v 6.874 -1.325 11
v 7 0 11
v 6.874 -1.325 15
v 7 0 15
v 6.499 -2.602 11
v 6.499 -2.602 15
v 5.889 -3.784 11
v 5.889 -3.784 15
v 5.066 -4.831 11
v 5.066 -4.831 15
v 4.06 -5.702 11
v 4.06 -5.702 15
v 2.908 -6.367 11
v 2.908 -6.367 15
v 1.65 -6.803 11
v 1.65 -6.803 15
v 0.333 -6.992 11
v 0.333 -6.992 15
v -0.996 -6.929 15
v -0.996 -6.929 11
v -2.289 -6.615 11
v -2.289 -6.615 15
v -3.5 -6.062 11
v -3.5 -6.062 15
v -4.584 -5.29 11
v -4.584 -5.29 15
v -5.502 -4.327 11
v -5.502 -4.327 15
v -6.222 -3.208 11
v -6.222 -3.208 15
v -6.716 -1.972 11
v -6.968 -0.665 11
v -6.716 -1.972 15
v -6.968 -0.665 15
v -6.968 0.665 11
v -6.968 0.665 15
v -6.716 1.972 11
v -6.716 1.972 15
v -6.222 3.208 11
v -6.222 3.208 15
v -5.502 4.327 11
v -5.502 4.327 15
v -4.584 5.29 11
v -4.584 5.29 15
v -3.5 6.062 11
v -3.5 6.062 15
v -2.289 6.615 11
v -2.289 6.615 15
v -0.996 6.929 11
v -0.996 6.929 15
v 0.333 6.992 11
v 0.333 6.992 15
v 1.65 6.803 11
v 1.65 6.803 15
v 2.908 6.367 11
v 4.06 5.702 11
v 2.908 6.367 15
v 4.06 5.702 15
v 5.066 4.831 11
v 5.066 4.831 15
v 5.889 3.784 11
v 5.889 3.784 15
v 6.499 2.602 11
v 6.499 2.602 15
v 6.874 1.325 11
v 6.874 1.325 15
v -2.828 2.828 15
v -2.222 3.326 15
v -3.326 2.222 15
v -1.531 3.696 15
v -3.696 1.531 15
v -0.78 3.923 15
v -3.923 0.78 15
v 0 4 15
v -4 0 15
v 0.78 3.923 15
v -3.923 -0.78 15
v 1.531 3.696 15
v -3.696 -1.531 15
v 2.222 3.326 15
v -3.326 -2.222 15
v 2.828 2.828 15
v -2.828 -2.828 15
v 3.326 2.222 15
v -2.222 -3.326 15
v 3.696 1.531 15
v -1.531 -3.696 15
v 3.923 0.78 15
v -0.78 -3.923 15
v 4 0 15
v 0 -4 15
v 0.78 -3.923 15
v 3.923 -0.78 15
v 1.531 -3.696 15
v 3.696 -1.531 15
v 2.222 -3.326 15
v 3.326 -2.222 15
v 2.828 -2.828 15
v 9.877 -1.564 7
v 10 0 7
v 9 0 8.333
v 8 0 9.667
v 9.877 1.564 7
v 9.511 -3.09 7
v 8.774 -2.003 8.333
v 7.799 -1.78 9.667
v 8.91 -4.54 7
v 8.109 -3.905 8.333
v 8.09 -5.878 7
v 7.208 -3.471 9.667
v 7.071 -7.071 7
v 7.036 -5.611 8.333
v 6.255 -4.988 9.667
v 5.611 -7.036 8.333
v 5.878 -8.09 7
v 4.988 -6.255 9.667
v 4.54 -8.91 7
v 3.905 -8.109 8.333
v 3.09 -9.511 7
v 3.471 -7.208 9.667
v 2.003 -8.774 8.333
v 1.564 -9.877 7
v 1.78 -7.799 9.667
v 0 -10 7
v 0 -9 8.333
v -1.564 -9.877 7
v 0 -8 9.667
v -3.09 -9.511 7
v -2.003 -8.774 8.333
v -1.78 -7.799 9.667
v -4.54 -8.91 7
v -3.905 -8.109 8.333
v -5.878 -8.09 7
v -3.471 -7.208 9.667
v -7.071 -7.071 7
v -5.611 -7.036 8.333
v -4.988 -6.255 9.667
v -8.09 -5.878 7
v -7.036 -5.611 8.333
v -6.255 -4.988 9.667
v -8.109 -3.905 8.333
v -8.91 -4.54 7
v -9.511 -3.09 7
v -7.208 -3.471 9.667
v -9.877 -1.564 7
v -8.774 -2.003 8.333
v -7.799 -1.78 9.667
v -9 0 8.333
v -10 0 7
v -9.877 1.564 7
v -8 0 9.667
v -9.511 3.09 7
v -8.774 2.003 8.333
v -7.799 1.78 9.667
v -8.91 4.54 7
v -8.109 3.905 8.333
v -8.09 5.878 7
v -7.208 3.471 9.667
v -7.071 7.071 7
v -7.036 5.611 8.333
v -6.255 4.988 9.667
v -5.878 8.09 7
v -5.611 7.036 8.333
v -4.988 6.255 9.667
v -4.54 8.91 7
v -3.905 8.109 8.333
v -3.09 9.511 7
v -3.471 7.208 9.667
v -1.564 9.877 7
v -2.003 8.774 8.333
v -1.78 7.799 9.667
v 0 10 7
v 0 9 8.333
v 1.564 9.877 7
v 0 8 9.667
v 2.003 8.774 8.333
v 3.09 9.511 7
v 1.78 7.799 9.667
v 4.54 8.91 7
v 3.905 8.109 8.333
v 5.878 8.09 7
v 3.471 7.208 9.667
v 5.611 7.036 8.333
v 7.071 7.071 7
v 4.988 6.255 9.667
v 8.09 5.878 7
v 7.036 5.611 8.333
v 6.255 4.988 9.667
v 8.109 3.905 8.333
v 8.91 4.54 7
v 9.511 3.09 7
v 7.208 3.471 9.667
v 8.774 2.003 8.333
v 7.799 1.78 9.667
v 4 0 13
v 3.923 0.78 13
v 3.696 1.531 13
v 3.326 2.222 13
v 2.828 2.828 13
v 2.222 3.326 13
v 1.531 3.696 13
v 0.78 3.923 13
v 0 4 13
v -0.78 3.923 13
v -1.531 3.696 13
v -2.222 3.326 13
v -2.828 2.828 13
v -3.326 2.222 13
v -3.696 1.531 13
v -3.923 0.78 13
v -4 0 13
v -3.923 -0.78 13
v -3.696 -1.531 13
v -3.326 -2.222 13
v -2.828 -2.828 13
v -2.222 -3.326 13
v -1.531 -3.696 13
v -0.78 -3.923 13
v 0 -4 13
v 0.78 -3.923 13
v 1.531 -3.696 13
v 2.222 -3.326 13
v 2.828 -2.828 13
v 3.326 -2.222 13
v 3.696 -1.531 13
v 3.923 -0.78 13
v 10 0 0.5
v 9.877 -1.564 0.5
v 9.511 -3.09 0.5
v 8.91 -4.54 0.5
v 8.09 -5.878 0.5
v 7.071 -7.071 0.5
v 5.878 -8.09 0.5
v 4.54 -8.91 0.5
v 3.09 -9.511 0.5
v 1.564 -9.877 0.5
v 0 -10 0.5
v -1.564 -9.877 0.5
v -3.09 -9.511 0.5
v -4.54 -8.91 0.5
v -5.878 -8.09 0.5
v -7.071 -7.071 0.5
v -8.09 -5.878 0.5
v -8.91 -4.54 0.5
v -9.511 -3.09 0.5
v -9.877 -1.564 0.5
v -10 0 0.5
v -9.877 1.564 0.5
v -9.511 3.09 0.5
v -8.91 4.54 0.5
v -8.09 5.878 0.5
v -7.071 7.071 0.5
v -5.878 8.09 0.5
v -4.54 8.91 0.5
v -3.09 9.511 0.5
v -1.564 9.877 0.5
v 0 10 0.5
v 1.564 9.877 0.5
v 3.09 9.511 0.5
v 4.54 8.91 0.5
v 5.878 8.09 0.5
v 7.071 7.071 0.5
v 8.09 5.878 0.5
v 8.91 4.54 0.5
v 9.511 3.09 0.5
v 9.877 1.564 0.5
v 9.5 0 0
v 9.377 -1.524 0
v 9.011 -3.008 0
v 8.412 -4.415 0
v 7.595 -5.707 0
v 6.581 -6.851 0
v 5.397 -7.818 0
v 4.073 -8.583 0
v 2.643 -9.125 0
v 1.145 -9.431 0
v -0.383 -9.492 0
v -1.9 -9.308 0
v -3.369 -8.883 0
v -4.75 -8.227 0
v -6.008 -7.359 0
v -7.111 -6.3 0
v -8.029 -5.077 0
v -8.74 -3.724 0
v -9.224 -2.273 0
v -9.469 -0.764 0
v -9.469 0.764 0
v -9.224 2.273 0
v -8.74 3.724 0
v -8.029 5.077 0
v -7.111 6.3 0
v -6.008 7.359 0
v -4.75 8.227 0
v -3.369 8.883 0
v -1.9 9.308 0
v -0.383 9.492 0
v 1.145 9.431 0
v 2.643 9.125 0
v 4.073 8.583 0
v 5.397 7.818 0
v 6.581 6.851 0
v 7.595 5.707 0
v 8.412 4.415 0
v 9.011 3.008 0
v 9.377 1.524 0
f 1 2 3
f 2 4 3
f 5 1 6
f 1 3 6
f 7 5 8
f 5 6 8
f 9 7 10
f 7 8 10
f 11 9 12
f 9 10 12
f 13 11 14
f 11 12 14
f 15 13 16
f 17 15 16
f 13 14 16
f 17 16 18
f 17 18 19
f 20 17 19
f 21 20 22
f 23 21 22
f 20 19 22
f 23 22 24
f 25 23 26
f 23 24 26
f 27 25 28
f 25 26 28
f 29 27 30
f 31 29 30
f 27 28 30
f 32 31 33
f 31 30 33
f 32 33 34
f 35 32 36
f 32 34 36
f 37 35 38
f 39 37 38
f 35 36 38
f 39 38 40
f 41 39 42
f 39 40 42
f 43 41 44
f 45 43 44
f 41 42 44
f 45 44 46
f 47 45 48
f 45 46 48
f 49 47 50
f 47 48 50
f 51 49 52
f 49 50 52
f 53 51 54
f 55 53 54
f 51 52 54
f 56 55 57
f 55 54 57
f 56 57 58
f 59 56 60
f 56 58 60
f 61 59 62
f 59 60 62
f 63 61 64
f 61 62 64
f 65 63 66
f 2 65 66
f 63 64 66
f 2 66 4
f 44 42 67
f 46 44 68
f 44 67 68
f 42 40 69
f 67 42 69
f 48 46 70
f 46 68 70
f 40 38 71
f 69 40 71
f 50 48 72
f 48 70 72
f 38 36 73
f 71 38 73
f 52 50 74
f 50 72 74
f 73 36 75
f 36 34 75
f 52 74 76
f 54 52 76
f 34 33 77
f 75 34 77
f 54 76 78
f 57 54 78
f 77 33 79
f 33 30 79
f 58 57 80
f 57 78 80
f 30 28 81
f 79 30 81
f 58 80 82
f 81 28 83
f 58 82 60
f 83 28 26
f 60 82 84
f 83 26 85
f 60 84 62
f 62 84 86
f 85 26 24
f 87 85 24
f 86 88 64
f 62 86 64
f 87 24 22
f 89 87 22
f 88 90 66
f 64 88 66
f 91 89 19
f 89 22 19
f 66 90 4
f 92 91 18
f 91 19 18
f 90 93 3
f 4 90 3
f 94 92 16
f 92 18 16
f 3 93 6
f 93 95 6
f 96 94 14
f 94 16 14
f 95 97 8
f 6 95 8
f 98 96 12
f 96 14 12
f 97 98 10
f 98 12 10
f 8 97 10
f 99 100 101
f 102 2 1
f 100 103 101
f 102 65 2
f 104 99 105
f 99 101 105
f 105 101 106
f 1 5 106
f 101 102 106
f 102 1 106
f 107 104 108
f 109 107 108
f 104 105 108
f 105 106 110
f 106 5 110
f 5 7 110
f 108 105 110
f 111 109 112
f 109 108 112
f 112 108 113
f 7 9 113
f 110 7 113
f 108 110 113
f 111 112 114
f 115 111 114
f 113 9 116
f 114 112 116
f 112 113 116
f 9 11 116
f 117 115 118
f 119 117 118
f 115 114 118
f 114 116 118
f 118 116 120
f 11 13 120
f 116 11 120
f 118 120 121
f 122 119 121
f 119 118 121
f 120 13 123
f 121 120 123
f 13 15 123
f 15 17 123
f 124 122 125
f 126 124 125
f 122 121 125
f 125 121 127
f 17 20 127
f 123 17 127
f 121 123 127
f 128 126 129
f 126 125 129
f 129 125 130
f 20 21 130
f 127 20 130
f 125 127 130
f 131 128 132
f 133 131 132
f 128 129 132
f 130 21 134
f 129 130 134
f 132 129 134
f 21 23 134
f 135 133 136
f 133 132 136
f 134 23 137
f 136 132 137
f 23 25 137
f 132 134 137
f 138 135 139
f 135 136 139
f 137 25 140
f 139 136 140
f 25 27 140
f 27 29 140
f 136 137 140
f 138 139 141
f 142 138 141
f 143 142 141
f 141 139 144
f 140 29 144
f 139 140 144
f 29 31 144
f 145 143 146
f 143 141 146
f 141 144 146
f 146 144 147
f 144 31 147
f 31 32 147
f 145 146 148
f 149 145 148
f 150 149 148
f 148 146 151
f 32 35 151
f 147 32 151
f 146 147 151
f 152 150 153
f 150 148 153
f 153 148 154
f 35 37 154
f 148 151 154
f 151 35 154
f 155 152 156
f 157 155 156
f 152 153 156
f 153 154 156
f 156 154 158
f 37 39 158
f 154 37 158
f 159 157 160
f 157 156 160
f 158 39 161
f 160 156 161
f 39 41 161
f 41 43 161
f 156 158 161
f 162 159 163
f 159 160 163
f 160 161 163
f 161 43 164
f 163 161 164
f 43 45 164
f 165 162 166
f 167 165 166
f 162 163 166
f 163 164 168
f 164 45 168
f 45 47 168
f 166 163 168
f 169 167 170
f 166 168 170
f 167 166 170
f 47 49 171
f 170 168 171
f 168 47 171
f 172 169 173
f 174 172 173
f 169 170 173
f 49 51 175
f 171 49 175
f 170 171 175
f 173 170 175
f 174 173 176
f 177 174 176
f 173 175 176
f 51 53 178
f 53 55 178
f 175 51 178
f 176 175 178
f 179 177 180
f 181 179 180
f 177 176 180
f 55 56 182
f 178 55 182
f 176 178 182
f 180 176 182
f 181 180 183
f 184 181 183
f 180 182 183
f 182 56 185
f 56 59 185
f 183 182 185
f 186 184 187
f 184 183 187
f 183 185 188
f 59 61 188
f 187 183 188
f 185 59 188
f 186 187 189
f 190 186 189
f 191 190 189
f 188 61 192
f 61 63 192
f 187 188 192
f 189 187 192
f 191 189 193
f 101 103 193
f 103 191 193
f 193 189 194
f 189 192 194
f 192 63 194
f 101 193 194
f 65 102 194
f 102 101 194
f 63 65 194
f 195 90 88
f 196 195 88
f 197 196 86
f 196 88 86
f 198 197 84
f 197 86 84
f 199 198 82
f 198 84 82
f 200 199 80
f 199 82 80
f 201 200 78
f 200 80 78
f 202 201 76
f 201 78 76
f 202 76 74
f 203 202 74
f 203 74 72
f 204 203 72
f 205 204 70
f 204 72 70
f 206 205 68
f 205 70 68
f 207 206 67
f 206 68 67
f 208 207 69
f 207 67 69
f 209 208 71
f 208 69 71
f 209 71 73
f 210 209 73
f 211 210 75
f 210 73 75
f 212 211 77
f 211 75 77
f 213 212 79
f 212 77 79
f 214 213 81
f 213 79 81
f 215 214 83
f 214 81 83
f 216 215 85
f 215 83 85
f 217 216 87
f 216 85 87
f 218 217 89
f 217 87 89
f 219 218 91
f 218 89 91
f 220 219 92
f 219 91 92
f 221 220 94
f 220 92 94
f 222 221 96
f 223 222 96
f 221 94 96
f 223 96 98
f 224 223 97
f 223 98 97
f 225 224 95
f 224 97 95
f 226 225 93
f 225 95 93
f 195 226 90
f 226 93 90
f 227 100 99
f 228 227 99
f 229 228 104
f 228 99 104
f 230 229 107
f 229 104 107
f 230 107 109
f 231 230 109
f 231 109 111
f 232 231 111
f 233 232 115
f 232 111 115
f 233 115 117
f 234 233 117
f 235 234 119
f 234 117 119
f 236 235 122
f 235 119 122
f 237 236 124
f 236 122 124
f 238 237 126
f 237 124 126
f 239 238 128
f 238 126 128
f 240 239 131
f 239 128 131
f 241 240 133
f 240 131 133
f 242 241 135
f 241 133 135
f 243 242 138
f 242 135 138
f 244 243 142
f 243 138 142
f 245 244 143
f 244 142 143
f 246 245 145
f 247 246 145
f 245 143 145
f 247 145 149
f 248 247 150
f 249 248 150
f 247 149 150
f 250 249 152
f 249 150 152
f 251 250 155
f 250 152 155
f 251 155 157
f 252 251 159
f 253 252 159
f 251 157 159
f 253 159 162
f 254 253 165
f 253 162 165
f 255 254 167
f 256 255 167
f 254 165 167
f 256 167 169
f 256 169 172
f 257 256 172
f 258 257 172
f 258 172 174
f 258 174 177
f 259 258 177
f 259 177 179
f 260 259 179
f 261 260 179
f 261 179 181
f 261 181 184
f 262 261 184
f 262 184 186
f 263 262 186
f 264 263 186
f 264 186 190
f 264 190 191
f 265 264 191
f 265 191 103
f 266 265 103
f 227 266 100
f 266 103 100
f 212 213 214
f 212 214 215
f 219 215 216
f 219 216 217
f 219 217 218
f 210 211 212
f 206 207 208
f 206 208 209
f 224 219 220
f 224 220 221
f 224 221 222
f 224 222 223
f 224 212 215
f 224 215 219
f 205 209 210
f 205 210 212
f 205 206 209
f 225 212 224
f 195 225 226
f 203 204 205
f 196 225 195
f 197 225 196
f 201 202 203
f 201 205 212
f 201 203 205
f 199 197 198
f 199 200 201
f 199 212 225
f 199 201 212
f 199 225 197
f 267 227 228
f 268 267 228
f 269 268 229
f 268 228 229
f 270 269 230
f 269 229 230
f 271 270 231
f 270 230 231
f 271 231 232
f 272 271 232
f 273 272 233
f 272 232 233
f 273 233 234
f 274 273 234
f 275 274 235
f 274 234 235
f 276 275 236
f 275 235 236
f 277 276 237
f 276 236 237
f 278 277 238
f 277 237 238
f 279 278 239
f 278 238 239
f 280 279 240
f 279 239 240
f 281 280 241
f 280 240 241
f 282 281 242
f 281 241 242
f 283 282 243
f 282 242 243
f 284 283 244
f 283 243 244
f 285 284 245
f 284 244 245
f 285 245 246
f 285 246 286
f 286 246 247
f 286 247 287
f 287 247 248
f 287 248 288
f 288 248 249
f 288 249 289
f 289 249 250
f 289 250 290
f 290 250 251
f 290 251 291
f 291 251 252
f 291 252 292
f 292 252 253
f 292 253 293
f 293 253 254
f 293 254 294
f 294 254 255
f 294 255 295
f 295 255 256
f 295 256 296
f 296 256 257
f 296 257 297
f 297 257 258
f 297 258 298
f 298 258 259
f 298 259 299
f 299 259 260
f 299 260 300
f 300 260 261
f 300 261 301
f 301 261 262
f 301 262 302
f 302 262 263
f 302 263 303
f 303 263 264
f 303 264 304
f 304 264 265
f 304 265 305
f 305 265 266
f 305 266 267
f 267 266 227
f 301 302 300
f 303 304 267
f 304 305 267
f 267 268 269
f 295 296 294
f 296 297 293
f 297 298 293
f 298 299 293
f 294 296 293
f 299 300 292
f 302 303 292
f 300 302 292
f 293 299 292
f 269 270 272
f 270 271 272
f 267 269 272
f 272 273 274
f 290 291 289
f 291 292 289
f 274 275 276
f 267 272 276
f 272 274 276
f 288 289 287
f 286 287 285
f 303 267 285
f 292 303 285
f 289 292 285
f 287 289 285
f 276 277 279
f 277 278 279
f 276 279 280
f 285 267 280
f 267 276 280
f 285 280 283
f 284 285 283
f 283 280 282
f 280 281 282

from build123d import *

# Parameters (mm, degrees)
F2_R     = 4
F3_DEPTH = 2
F4_SIZE  = 0.5


with BuildPart() as f1:
    # F0 (on Front) → F1 (revolve)
    with BuildSketch(Plane.XZ):
        Polygon((0, 15), (0, 0), (10, 0), (10, 7), (7, 11), (7, 15), align=None)
    revolve(axis=Axis((0, 0, 7.5), (0, 0, -1)))

    # F2 (on face) → F3 (cut)
    with BuildSketch(Plane.XY.offset(15)):
        Circle(F2_R)
    extrude(amount=-F3_DEPTH, mode=Mode.SUBTRACT)

    # F4
    f4_edges = [f1.edges().sort_by_distance(p)[0] for p in [
        (-10, 0, 0),
    ]]
    chamfer(f4_edges, length=F4_SIZE)


solid = f1.part
